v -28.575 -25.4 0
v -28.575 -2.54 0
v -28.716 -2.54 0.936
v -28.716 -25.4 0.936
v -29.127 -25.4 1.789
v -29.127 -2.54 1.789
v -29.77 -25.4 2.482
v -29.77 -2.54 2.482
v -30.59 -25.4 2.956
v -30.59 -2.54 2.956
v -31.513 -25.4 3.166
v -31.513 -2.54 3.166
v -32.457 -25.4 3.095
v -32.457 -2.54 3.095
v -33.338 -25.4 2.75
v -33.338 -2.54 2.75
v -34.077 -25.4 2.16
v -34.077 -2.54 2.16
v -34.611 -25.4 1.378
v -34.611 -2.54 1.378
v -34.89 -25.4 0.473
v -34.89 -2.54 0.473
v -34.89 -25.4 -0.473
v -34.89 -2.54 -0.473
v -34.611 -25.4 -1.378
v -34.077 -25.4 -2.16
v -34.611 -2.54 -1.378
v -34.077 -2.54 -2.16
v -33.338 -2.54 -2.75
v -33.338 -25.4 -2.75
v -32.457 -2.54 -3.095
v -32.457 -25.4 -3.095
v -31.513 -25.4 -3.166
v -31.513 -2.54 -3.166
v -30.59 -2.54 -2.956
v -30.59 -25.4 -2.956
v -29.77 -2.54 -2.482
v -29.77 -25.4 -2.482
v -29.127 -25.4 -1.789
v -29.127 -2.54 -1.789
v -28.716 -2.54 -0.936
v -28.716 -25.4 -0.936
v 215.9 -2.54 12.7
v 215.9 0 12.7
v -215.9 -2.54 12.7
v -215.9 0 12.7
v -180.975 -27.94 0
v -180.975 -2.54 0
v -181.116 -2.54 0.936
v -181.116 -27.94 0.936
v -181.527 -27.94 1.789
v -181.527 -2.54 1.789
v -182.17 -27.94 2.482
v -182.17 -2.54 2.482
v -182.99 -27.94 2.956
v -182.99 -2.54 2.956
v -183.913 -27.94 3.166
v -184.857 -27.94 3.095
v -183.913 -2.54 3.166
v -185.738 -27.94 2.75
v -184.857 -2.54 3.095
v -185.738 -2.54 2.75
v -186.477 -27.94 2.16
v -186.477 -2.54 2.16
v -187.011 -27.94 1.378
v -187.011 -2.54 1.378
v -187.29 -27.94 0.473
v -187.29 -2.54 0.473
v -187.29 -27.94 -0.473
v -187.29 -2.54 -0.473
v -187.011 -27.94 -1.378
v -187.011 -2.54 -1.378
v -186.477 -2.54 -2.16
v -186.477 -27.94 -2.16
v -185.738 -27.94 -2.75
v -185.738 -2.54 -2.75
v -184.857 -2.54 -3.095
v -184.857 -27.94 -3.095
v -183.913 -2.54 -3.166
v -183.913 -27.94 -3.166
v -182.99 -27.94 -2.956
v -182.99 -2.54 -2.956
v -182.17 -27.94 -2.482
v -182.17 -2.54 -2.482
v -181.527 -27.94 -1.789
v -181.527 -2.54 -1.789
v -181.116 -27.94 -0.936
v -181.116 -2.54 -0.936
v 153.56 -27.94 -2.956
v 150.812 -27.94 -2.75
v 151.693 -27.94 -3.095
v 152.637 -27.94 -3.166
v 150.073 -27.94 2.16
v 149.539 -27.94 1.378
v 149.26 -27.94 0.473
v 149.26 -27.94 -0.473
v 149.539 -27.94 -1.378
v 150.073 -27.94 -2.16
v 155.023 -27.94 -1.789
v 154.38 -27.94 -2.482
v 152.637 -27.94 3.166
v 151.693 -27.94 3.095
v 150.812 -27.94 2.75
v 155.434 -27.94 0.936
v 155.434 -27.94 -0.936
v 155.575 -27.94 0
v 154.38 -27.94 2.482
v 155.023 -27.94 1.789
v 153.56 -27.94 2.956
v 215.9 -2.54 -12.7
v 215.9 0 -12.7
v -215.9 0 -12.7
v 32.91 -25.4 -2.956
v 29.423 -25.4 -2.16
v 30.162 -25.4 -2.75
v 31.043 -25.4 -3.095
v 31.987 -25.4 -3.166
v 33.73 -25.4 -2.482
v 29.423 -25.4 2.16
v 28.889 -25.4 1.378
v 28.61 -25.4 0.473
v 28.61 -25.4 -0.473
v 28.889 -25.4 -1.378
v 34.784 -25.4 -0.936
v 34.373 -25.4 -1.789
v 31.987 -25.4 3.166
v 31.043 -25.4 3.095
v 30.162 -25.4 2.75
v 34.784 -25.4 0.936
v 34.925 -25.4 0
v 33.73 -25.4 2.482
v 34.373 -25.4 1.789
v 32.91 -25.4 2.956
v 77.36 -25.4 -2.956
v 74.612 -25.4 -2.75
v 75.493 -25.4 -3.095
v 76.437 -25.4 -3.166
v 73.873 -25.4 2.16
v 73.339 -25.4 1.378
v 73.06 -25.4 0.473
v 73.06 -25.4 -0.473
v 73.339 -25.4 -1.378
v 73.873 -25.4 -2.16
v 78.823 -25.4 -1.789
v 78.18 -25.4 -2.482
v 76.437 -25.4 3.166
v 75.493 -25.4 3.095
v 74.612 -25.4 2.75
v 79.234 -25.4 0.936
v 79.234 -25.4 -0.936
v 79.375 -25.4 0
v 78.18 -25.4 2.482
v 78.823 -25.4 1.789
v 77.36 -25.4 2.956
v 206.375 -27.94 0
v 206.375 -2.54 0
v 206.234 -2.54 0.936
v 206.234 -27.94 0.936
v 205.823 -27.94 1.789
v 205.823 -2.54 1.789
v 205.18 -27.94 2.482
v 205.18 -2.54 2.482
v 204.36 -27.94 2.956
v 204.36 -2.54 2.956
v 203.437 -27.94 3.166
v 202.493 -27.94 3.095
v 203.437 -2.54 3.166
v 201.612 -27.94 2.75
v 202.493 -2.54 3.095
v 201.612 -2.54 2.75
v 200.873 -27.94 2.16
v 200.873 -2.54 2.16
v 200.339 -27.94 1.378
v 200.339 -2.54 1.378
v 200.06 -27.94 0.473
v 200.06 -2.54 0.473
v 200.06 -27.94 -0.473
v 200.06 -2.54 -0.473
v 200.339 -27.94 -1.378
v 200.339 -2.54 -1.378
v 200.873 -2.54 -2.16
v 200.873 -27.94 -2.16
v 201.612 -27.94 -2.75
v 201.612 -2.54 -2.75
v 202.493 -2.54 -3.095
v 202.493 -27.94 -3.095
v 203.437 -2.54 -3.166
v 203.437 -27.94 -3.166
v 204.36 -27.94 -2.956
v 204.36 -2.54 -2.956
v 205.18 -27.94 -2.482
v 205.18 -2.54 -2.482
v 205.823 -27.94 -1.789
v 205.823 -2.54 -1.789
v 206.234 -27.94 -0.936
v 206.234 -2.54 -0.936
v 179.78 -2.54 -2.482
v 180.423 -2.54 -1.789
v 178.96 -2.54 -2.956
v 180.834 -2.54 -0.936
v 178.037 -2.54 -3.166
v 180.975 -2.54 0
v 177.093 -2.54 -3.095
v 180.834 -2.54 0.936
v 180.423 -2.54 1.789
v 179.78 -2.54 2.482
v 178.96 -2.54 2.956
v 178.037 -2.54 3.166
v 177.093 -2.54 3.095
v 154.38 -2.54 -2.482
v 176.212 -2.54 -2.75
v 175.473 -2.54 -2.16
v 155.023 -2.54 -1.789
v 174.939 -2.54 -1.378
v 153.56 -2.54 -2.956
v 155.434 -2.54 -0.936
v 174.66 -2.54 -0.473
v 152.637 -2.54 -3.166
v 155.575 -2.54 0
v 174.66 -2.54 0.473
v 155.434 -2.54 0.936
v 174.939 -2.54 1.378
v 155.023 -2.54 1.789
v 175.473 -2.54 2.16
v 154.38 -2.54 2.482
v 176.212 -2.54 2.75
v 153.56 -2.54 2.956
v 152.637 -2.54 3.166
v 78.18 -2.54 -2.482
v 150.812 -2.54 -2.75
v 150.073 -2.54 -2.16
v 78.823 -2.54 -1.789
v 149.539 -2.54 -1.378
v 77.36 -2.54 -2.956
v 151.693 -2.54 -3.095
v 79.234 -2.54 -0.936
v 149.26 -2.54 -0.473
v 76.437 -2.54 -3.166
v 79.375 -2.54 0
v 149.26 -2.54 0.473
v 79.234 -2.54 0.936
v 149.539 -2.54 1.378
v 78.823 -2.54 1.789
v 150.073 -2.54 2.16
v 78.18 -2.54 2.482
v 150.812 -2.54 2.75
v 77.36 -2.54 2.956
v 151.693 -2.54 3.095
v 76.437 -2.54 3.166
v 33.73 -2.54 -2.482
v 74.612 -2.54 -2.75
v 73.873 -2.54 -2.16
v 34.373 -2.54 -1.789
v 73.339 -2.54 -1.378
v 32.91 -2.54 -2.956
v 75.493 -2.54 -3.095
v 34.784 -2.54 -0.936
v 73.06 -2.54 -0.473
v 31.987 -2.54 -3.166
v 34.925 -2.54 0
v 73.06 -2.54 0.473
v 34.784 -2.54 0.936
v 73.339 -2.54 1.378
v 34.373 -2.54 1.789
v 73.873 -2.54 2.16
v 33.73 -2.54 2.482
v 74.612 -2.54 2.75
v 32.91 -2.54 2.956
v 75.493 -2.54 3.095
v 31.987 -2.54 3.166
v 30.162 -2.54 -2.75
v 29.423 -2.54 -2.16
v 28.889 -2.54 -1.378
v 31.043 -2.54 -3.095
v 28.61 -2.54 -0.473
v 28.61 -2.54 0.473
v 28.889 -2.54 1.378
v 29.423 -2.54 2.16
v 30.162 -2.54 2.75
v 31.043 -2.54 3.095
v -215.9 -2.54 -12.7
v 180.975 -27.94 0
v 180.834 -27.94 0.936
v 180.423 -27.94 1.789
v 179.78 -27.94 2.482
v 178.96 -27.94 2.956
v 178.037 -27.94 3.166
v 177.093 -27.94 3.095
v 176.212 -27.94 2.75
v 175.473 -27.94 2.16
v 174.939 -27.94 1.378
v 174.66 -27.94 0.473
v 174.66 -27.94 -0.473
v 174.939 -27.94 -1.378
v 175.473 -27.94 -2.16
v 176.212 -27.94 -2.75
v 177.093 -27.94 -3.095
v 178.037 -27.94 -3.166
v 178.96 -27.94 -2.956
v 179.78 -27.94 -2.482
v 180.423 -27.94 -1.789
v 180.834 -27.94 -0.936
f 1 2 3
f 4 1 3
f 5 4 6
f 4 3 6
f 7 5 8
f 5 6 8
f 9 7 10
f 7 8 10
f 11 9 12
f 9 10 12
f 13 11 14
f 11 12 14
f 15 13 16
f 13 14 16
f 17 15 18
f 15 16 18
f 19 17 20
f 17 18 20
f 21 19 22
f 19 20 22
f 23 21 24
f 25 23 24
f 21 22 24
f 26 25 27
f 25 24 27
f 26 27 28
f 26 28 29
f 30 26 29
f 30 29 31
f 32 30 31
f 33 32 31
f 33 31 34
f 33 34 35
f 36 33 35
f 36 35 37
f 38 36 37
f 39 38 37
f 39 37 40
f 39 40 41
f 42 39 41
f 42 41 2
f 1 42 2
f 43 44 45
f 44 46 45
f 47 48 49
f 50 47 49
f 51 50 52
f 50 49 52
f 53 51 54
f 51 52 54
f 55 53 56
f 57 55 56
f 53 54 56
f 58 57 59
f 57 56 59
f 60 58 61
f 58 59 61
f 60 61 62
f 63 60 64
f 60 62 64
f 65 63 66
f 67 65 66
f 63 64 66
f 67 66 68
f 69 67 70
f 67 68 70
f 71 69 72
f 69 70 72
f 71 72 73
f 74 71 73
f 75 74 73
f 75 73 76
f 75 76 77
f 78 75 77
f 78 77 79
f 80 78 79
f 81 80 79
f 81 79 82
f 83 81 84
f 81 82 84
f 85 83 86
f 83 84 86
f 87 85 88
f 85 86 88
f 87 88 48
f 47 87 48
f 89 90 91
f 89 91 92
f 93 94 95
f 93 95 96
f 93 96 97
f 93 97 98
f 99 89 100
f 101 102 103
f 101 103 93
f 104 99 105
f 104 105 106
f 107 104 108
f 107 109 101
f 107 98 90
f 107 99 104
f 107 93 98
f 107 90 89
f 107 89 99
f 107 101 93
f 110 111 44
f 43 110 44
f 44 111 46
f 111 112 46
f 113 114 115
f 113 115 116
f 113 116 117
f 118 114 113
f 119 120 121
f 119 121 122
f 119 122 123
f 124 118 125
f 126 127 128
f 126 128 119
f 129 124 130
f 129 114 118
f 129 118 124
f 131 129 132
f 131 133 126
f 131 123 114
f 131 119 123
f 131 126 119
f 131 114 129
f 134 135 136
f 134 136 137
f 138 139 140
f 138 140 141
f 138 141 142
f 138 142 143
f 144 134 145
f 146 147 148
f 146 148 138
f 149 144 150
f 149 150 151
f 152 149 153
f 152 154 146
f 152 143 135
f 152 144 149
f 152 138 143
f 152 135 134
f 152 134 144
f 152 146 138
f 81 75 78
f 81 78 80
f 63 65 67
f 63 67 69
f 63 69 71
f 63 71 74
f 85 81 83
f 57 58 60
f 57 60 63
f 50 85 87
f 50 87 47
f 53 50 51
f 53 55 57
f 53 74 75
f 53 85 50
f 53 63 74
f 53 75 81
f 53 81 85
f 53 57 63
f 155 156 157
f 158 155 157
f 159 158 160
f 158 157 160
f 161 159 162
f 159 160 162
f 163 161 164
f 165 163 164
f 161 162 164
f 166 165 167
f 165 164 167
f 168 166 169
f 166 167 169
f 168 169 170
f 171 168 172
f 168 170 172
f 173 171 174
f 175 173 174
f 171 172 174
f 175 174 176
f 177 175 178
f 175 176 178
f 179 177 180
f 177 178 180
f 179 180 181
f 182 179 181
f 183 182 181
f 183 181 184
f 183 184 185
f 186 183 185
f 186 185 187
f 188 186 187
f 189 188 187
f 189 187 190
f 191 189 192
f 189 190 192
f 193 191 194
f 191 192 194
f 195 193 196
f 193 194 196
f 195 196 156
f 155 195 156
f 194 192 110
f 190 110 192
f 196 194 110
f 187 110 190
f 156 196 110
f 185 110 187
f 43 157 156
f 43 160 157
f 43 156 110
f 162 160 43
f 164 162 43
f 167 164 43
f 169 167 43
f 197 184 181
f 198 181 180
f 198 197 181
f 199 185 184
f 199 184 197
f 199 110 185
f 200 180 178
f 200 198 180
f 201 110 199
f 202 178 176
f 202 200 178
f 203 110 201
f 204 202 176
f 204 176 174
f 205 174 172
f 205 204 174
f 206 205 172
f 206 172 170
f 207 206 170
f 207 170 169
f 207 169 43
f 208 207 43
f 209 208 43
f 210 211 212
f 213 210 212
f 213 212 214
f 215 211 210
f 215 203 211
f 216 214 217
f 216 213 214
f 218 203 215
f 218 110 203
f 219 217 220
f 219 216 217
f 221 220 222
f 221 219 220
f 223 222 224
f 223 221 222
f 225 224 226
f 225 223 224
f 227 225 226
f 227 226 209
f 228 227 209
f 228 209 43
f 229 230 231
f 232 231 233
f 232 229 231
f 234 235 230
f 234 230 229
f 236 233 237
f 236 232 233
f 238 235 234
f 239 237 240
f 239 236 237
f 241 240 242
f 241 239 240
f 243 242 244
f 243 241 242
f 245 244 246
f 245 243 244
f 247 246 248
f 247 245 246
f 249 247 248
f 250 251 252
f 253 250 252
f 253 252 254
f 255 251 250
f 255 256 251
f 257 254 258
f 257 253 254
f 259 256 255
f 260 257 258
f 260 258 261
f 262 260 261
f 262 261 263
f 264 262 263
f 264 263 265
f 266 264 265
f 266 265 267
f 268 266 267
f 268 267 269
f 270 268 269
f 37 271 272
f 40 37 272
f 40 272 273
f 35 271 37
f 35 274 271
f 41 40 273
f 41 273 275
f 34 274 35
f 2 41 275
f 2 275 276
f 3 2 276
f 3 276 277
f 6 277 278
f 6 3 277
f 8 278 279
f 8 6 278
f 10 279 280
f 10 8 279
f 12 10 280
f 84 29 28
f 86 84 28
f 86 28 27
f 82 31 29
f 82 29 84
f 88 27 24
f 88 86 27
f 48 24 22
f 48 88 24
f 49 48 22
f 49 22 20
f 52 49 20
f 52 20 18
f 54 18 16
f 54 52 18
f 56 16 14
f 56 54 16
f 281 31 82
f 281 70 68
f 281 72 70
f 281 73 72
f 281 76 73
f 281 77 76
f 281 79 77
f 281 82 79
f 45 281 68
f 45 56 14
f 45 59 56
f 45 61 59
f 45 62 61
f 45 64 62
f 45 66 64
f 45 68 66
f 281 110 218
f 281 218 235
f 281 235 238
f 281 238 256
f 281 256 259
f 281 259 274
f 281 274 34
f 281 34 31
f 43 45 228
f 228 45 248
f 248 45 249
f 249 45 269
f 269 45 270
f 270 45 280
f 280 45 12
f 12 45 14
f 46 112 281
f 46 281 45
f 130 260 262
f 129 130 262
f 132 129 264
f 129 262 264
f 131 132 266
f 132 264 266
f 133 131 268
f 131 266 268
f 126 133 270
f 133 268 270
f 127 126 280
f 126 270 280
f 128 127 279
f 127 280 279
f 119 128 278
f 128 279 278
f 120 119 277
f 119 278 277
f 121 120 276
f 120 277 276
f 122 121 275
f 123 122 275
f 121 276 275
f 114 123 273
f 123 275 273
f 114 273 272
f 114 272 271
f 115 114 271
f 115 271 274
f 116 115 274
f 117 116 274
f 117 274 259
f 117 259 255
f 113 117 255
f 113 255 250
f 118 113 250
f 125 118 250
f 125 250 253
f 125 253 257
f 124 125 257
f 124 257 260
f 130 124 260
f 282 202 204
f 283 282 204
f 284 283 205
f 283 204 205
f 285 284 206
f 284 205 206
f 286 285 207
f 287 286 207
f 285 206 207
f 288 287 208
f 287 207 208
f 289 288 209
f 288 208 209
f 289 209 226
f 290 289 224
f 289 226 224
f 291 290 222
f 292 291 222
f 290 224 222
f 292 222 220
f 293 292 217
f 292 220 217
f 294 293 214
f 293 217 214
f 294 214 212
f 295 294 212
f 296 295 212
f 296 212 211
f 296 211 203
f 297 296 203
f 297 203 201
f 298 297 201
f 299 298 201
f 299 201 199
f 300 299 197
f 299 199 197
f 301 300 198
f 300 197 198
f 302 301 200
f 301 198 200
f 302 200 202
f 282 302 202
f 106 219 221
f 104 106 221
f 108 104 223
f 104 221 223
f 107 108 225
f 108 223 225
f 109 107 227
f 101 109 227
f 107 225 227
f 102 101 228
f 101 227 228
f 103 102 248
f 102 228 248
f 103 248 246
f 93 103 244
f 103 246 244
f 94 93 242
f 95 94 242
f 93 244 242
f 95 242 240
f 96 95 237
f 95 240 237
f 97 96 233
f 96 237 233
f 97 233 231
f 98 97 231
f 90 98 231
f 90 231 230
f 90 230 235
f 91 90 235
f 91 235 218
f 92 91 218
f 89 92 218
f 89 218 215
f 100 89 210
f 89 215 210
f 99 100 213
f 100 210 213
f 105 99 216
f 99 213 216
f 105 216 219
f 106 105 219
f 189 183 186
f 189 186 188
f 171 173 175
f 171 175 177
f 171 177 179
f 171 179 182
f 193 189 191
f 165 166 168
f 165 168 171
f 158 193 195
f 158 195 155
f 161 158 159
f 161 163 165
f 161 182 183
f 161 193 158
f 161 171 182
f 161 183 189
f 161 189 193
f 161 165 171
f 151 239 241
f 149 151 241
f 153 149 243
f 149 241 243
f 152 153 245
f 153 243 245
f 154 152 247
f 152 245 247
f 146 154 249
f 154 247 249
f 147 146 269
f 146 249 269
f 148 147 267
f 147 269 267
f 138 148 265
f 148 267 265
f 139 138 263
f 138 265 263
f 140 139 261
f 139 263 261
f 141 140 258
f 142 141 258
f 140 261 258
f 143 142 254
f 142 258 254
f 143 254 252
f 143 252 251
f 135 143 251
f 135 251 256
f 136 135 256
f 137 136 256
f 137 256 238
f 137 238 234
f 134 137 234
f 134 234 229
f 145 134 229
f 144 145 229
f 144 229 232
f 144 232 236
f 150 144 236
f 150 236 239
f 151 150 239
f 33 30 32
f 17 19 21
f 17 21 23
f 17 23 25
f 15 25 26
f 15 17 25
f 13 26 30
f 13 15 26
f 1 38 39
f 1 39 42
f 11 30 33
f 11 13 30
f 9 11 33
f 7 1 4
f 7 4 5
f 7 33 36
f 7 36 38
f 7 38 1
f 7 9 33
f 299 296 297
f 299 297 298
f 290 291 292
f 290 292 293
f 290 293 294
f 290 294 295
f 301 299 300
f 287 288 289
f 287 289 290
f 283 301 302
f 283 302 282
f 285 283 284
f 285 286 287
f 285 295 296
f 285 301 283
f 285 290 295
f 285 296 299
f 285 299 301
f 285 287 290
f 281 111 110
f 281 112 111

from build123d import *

# Parameters (mm, degrees)
F0_W      = 177.8
F0_H      = 25.4
F1_DEPTH  = 2.54
F2_R      = 3.175
F3_DEPTH  = 25.4
F4_DEPTH  = 25.4
F5_DEPTH  = 127
F6_R      = 3.175
F7_DEPTH  = 25.4
F8_DEPTH  = 127
F9_R      = 3.175
F10_DEPTH = 25.4


with BuildPart() as f1:
    # F0 (on Front) → F1 (new body)
    with BuildSketch(Plane.XZ):
        Rectangle(F0_W, F0_H)
    extrude(amount=F1_DEPTH)

    # F2 (on Front) → F3 (join)
    with BuildSketch(Plane.XZ):
        with Locations((-31.75, 0)):
            Circle(F2_R)
        with Locations((31.75, 0)):
            Circle(F2_R)
    extrude(amount=F3_DEPTH)

    # F2 (on Front) → F4 (join)
    with BuildSketch(Plane.XZ):
        with Locations((-31.75, 0)):
            Circle(F2_R)
        with Locations((31.75, 0)):
            Circle(F2_R)
        with Locations((76.2, 0)):
            Circle(F2_R)
    extrude(amount=F4_DEPTH)

    # F5 (add): a face of the model
    f5_faces = [f1.faces().sort_by_distance(p)[0] for p in [
        (-88.9, -1.27, 0),
    ]]
    extrude(f5_faces, amount=F5_DEPTH)

    # F6 (on face) → F7 (join)
    with BuildSketch(Plane.XZ.offset(2.54)):
        with Locations((-184.15, 0)):
            Circle(F6_R)
    extrude(amount=F7_DEPTH)

    # F8 (add): a face of the model
    f8_faces = [f1.faces().sort_by_distance(p)[0] for p in [
        (88.9, -1.27, 0),
    ]]
    extrude(f8_faces, amount=F8_DEPTH)

    # F9 (on face) → F10 (join)
    with BuildSketch(Plane.XZ.offset(2.54)):
        with Locations((152.4, 0)):
            Circle(F9_R)
        with Locations((177.8, 0)):
            Circle(F9_R)
        with Locations((203.2, 0)):
            Circle(F9_R)
    extrude(amount=F10_DEPTH)


solid = f1.part
